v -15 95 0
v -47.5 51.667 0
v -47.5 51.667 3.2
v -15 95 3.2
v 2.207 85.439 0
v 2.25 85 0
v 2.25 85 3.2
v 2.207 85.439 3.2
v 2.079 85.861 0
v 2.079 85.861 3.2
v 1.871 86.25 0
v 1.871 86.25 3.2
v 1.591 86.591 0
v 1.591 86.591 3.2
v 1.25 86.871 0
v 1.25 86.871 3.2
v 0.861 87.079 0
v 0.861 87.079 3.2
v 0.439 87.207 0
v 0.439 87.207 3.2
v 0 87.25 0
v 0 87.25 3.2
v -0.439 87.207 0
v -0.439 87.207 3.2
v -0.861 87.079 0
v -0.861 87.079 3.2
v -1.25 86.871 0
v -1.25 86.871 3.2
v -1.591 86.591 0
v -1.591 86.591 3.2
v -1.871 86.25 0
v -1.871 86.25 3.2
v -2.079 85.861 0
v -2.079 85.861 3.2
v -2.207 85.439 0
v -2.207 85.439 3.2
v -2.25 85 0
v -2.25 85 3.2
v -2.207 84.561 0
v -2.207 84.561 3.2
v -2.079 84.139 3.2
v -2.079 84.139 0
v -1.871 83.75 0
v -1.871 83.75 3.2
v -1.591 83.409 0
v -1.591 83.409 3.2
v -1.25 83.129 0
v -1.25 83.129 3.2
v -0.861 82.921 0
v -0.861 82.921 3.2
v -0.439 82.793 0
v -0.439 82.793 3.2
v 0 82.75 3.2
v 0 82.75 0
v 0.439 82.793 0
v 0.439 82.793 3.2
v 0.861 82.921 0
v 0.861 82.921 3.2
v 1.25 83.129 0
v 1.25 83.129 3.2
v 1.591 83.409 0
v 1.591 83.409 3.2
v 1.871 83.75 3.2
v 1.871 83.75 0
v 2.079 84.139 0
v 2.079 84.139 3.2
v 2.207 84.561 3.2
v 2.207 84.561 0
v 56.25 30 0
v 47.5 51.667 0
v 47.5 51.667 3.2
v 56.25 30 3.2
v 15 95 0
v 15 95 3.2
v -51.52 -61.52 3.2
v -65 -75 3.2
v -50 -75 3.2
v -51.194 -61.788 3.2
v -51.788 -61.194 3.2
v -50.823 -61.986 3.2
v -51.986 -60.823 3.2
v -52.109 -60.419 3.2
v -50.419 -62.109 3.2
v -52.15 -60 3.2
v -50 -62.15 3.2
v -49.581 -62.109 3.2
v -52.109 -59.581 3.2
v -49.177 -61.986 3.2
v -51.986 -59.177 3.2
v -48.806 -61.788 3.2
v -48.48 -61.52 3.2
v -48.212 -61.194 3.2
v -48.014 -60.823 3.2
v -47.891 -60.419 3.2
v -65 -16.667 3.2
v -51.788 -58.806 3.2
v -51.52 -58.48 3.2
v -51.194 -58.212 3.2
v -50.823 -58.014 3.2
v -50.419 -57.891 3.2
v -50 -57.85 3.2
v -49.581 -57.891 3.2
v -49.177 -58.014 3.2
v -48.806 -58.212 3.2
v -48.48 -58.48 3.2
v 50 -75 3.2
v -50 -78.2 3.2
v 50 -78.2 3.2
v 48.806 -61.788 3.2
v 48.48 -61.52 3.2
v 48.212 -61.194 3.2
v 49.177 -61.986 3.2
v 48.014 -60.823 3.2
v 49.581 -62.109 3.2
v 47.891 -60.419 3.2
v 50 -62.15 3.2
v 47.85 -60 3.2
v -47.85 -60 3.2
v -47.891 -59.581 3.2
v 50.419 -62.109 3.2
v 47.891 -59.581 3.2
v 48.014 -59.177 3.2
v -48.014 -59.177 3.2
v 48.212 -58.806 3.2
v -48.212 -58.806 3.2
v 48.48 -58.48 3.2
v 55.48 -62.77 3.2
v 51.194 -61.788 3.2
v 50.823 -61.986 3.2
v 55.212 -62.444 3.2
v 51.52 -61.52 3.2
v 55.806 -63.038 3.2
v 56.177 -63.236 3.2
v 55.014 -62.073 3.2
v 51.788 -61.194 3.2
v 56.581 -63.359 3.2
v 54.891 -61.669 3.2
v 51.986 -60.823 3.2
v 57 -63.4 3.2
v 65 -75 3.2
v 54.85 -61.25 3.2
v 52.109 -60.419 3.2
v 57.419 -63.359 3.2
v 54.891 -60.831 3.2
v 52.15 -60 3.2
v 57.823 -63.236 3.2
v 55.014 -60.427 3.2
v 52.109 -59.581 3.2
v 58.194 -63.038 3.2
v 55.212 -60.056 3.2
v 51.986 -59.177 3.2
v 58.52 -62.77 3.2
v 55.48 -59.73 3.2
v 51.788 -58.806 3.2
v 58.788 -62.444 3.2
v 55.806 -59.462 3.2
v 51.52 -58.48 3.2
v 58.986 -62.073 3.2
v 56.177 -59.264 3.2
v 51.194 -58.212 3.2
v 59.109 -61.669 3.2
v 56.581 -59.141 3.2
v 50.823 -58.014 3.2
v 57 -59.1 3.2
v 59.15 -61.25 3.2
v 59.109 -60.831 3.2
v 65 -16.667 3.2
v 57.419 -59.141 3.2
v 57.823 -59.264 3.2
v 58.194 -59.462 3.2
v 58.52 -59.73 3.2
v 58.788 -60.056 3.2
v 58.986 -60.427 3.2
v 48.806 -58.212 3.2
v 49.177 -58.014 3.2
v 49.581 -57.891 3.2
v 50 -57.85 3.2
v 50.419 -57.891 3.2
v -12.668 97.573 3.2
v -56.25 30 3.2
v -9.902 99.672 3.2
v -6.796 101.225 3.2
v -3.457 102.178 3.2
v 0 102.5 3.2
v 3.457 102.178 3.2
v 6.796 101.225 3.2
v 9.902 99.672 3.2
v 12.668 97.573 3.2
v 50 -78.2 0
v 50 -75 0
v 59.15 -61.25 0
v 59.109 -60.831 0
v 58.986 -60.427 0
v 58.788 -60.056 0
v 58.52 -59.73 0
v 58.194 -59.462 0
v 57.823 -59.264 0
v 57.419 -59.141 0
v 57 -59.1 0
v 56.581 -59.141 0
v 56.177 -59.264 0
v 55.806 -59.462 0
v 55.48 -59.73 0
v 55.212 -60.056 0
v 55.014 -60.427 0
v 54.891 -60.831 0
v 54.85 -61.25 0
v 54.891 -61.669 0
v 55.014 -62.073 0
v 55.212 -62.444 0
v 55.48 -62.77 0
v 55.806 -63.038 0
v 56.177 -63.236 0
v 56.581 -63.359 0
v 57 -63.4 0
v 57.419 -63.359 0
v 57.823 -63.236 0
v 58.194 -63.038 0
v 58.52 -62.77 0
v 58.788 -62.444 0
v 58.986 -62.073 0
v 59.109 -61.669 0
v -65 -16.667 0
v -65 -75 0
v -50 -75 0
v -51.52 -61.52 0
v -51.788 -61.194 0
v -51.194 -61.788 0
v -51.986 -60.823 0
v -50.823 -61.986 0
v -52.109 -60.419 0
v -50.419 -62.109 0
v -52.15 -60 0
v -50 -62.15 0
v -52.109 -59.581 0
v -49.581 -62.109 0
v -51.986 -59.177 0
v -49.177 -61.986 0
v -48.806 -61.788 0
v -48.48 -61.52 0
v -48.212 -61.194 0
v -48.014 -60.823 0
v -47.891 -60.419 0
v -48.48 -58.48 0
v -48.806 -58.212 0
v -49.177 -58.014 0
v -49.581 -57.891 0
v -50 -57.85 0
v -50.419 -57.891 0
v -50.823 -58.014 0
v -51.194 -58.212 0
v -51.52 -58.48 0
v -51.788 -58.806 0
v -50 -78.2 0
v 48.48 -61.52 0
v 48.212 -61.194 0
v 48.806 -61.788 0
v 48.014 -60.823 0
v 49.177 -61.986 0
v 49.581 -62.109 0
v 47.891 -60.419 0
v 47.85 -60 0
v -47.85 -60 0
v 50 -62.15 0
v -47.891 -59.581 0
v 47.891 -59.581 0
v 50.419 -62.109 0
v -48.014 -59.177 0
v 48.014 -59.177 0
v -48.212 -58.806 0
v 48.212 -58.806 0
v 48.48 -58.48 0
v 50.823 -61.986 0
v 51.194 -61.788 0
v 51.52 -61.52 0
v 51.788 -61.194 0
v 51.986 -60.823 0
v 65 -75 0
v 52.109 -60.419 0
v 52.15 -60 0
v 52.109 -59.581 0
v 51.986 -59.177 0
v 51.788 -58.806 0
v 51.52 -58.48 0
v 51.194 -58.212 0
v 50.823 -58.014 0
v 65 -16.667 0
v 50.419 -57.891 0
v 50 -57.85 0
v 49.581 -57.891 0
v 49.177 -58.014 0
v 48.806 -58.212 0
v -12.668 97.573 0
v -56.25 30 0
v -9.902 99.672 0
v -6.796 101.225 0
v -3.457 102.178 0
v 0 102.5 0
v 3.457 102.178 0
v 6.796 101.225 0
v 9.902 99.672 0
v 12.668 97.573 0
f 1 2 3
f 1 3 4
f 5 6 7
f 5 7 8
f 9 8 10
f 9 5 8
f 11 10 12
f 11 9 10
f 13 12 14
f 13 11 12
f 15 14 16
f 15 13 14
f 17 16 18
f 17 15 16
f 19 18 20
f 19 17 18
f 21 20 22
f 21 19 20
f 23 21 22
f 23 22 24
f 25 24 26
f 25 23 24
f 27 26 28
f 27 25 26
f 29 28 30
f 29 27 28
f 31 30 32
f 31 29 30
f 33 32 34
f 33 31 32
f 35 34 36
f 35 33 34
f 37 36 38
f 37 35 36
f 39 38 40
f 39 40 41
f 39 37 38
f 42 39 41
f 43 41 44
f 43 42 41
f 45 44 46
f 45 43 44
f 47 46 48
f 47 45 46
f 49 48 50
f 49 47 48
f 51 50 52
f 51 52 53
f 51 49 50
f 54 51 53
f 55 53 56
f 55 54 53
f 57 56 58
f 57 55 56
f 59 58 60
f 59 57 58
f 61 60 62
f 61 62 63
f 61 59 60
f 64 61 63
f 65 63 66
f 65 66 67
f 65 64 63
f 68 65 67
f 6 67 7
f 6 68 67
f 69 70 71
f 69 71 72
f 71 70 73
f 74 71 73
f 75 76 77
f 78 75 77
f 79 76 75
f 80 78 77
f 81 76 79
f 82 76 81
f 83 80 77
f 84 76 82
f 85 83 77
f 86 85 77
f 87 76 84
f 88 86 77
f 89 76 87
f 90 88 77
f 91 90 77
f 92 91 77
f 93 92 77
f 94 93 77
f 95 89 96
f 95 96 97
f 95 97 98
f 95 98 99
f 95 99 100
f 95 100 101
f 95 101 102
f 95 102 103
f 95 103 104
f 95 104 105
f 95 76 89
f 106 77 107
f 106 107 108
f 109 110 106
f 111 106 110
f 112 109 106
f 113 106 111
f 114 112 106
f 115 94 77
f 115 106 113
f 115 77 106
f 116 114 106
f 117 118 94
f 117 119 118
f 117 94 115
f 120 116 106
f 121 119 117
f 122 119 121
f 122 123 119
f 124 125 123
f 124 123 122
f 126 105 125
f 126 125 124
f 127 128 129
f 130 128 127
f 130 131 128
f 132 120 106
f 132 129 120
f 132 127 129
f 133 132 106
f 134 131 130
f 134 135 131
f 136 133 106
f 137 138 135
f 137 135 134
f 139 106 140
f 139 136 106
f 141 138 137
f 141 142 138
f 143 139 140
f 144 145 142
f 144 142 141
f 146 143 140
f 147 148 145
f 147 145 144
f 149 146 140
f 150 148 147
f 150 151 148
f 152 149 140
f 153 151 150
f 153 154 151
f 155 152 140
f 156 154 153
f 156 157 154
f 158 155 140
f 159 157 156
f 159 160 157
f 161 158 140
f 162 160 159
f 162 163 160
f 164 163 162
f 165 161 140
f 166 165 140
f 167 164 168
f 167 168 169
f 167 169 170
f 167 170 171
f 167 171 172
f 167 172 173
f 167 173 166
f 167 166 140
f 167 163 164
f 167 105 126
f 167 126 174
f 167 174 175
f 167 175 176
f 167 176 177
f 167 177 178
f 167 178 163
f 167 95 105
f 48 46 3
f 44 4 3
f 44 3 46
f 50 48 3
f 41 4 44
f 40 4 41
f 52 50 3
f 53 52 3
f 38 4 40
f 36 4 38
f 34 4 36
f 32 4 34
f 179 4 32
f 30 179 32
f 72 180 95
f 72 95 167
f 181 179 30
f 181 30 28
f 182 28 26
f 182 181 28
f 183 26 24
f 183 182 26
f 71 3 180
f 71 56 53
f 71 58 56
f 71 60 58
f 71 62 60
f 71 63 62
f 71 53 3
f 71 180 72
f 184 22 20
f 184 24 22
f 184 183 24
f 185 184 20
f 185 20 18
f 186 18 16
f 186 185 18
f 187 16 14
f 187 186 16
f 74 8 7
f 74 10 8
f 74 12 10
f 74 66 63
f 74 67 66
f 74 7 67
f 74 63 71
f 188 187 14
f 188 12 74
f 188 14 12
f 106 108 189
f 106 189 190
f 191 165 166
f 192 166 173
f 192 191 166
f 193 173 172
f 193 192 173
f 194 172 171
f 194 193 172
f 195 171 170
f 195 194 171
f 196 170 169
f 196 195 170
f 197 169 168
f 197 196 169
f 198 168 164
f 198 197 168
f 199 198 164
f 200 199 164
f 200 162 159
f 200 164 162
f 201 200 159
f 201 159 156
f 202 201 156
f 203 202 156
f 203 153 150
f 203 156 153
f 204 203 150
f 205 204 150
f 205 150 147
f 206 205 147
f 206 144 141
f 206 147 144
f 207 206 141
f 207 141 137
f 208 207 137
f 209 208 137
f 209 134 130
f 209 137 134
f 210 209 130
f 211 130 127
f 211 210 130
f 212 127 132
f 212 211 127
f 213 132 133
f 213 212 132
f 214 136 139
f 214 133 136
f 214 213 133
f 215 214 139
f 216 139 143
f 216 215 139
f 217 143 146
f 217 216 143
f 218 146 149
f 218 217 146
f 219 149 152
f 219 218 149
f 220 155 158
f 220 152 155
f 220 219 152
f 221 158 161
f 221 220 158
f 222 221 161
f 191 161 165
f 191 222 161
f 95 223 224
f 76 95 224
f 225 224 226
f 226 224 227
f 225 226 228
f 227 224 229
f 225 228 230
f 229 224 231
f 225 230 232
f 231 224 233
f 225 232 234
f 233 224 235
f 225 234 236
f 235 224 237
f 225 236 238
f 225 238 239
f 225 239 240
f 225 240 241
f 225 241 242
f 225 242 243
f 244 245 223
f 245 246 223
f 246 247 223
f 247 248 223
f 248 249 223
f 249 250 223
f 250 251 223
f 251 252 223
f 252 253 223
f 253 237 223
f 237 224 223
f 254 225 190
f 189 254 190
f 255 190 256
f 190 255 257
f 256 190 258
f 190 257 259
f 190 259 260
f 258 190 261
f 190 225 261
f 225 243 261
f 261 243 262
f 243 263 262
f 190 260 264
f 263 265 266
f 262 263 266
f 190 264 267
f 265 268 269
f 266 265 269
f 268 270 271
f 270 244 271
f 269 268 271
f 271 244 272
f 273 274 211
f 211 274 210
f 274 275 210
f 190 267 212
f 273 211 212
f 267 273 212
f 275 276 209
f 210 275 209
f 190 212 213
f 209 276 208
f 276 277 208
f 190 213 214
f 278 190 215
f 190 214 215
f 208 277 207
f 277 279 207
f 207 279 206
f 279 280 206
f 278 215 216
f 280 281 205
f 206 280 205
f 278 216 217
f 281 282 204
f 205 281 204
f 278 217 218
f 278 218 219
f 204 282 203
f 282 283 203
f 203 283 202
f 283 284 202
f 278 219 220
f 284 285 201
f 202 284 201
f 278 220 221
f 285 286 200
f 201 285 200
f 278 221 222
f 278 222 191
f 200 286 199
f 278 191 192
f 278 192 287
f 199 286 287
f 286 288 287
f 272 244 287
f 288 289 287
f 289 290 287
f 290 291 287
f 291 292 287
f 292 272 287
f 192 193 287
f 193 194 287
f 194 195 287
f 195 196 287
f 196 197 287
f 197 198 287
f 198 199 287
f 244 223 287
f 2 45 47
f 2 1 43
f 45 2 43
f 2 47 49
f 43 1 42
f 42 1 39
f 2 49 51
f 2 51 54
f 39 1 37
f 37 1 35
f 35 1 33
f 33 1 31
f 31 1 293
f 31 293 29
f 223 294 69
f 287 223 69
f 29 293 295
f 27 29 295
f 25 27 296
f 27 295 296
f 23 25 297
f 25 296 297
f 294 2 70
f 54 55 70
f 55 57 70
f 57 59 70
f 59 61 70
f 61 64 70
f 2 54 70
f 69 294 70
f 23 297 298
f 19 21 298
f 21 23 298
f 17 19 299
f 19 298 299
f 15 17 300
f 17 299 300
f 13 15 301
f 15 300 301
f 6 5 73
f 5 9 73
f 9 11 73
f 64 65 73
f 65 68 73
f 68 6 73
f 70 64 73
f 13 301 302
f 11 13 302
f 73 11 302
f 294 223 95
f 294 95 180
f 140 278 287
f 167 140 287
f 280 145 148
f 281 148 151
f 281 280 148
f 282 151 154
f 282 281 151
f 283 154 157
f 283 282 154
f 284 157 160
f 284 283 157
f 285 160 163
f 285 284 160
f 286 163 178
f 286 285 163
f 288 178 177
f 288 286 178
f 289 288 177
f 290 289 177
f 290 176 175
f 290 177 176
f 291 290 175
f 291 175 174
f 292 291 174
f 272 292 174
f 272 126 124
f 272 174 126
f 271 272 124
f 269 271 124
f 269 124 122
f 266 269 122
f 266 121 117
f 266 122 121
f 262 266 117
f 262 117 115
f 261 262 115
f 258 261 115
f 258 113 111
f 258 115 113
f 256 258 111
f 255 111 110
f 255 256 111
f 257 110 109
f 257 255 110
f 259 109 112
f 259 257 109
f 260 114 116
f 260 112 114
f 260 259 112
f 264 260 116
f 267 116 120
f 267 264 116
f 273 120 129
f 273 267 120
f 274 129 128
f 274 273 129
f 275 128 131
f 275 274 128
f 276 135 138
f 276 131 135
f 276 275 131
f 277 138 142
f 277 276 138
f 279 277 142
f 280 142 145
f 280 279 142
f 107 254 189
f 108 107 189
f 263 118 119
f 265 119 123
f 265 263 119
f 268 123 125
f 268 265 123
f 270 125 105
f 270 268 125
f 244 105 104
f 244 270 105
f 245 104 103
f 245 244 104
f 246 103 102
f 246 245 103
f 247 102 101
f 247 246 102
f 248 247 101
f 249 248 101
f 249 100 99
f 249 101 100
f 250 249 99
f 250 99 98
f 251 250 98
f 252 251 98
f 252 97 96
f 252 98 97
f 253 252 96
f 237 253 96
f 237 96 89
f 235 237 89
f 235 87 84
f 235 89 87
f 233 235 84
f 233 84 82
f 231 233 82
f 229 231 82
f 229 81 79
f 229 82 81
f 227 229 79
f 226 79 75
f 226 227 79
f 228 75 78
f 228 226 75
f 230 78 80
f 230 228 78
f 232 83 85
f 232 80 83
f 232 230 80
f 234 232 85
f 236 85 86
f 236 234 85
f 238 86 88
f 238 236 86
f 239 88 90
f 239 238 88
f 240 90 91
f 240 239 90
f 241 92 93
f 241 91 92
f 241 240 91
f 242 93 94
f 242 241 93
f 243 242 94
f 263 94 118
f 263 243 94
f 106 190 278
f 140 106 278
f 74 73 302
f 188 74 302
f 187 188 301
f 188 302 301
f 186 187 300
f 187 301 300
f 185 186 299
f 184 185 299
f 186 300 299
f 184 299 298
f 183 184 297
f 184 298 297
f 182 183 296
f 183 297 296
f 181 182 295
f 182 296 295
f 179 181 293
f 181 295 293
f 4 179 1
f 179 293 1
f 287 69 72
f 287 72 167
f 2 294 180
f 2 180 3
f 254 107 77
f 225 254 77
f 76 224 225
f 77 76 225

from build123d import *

# Parameters (mm, degrees)
F0_W     = 30
F0_H     = 20
F0_R     = 2.25
F1_DEPTH = 3.2
F2_R     = 2.15
F3_DEPTH = 54
F4_W     = 100
F4_H     = 3.2
F5_DEPTH = 3.2


with BuildPart() as f1:
    # F0 (on Top) → F1 (new body)
    with BuildSketch(Plane.XY):
        Polygon((-65, -75), (65, -75), (65, 75), (30, 75), (15, 75), (-15, 75), (-30, 75), (-65, 75), align=None)
        Polygon((15, 75), (30, 75), (15, 95), align=None)
        Polygon((-15, 95), (-30, 75), (-15, 75), align=None)
        with Locations((0, 85)):
            Rectangle(F0_W, F0_H)
        with Locations((0, 85)):
            Circle(F0_R, mode=Mode.SUBTRACT)
        with BuildLine():
            Line((-15, 95), (15, 95))
            ThreePointArc((15, 95), (0, 102.5), (-15, 95))
        make_face()
    extrude(amount=F1_DEPTH)

    # F2 (on Top) → F3 (cut)
    with BuildSketch(Plane.XY):
        with Locations((-50, -60)):
            Circle(F2_R)
        with Locations((50, -60)):
            Circle(F2_R)
        Polygon((-30, 75), (-65, 75), (-65, 28.3333333333), (-47.5, 51.6666666667), align=None)
        Polygon((-47.5, 51.6666666667), (-65, 28.3333333333), (-65, 8.3333333333), (-56.25, 30), align=None)
        Polygon((-56.25, 30), (-65, 8.3333333333), (-65, -16.6666666667), align=None)
        Polygon((65, 8.3333333333), (65, 75), (30, 75), (47.5, 51.6666666667), (56.25, 30), align=None)
        Polygon((65, -16.6666666667), (65, 8.3333333333), (56.25, 30), align=None)
        with Locations((57, -61.25)):
            Circle(F2_R)
    extrude(amount=F3_DEPTH, mode=Mode.SUBTRACT)

    # F4 (on Top) → F5 (join)
    with BuildSketch(Plane.XY):
        with Locations((0, -76.6)):
            Rectangle(F4_W, F4_H)
    extrude(amount=F5_DEPTH)


solid = f1.part
